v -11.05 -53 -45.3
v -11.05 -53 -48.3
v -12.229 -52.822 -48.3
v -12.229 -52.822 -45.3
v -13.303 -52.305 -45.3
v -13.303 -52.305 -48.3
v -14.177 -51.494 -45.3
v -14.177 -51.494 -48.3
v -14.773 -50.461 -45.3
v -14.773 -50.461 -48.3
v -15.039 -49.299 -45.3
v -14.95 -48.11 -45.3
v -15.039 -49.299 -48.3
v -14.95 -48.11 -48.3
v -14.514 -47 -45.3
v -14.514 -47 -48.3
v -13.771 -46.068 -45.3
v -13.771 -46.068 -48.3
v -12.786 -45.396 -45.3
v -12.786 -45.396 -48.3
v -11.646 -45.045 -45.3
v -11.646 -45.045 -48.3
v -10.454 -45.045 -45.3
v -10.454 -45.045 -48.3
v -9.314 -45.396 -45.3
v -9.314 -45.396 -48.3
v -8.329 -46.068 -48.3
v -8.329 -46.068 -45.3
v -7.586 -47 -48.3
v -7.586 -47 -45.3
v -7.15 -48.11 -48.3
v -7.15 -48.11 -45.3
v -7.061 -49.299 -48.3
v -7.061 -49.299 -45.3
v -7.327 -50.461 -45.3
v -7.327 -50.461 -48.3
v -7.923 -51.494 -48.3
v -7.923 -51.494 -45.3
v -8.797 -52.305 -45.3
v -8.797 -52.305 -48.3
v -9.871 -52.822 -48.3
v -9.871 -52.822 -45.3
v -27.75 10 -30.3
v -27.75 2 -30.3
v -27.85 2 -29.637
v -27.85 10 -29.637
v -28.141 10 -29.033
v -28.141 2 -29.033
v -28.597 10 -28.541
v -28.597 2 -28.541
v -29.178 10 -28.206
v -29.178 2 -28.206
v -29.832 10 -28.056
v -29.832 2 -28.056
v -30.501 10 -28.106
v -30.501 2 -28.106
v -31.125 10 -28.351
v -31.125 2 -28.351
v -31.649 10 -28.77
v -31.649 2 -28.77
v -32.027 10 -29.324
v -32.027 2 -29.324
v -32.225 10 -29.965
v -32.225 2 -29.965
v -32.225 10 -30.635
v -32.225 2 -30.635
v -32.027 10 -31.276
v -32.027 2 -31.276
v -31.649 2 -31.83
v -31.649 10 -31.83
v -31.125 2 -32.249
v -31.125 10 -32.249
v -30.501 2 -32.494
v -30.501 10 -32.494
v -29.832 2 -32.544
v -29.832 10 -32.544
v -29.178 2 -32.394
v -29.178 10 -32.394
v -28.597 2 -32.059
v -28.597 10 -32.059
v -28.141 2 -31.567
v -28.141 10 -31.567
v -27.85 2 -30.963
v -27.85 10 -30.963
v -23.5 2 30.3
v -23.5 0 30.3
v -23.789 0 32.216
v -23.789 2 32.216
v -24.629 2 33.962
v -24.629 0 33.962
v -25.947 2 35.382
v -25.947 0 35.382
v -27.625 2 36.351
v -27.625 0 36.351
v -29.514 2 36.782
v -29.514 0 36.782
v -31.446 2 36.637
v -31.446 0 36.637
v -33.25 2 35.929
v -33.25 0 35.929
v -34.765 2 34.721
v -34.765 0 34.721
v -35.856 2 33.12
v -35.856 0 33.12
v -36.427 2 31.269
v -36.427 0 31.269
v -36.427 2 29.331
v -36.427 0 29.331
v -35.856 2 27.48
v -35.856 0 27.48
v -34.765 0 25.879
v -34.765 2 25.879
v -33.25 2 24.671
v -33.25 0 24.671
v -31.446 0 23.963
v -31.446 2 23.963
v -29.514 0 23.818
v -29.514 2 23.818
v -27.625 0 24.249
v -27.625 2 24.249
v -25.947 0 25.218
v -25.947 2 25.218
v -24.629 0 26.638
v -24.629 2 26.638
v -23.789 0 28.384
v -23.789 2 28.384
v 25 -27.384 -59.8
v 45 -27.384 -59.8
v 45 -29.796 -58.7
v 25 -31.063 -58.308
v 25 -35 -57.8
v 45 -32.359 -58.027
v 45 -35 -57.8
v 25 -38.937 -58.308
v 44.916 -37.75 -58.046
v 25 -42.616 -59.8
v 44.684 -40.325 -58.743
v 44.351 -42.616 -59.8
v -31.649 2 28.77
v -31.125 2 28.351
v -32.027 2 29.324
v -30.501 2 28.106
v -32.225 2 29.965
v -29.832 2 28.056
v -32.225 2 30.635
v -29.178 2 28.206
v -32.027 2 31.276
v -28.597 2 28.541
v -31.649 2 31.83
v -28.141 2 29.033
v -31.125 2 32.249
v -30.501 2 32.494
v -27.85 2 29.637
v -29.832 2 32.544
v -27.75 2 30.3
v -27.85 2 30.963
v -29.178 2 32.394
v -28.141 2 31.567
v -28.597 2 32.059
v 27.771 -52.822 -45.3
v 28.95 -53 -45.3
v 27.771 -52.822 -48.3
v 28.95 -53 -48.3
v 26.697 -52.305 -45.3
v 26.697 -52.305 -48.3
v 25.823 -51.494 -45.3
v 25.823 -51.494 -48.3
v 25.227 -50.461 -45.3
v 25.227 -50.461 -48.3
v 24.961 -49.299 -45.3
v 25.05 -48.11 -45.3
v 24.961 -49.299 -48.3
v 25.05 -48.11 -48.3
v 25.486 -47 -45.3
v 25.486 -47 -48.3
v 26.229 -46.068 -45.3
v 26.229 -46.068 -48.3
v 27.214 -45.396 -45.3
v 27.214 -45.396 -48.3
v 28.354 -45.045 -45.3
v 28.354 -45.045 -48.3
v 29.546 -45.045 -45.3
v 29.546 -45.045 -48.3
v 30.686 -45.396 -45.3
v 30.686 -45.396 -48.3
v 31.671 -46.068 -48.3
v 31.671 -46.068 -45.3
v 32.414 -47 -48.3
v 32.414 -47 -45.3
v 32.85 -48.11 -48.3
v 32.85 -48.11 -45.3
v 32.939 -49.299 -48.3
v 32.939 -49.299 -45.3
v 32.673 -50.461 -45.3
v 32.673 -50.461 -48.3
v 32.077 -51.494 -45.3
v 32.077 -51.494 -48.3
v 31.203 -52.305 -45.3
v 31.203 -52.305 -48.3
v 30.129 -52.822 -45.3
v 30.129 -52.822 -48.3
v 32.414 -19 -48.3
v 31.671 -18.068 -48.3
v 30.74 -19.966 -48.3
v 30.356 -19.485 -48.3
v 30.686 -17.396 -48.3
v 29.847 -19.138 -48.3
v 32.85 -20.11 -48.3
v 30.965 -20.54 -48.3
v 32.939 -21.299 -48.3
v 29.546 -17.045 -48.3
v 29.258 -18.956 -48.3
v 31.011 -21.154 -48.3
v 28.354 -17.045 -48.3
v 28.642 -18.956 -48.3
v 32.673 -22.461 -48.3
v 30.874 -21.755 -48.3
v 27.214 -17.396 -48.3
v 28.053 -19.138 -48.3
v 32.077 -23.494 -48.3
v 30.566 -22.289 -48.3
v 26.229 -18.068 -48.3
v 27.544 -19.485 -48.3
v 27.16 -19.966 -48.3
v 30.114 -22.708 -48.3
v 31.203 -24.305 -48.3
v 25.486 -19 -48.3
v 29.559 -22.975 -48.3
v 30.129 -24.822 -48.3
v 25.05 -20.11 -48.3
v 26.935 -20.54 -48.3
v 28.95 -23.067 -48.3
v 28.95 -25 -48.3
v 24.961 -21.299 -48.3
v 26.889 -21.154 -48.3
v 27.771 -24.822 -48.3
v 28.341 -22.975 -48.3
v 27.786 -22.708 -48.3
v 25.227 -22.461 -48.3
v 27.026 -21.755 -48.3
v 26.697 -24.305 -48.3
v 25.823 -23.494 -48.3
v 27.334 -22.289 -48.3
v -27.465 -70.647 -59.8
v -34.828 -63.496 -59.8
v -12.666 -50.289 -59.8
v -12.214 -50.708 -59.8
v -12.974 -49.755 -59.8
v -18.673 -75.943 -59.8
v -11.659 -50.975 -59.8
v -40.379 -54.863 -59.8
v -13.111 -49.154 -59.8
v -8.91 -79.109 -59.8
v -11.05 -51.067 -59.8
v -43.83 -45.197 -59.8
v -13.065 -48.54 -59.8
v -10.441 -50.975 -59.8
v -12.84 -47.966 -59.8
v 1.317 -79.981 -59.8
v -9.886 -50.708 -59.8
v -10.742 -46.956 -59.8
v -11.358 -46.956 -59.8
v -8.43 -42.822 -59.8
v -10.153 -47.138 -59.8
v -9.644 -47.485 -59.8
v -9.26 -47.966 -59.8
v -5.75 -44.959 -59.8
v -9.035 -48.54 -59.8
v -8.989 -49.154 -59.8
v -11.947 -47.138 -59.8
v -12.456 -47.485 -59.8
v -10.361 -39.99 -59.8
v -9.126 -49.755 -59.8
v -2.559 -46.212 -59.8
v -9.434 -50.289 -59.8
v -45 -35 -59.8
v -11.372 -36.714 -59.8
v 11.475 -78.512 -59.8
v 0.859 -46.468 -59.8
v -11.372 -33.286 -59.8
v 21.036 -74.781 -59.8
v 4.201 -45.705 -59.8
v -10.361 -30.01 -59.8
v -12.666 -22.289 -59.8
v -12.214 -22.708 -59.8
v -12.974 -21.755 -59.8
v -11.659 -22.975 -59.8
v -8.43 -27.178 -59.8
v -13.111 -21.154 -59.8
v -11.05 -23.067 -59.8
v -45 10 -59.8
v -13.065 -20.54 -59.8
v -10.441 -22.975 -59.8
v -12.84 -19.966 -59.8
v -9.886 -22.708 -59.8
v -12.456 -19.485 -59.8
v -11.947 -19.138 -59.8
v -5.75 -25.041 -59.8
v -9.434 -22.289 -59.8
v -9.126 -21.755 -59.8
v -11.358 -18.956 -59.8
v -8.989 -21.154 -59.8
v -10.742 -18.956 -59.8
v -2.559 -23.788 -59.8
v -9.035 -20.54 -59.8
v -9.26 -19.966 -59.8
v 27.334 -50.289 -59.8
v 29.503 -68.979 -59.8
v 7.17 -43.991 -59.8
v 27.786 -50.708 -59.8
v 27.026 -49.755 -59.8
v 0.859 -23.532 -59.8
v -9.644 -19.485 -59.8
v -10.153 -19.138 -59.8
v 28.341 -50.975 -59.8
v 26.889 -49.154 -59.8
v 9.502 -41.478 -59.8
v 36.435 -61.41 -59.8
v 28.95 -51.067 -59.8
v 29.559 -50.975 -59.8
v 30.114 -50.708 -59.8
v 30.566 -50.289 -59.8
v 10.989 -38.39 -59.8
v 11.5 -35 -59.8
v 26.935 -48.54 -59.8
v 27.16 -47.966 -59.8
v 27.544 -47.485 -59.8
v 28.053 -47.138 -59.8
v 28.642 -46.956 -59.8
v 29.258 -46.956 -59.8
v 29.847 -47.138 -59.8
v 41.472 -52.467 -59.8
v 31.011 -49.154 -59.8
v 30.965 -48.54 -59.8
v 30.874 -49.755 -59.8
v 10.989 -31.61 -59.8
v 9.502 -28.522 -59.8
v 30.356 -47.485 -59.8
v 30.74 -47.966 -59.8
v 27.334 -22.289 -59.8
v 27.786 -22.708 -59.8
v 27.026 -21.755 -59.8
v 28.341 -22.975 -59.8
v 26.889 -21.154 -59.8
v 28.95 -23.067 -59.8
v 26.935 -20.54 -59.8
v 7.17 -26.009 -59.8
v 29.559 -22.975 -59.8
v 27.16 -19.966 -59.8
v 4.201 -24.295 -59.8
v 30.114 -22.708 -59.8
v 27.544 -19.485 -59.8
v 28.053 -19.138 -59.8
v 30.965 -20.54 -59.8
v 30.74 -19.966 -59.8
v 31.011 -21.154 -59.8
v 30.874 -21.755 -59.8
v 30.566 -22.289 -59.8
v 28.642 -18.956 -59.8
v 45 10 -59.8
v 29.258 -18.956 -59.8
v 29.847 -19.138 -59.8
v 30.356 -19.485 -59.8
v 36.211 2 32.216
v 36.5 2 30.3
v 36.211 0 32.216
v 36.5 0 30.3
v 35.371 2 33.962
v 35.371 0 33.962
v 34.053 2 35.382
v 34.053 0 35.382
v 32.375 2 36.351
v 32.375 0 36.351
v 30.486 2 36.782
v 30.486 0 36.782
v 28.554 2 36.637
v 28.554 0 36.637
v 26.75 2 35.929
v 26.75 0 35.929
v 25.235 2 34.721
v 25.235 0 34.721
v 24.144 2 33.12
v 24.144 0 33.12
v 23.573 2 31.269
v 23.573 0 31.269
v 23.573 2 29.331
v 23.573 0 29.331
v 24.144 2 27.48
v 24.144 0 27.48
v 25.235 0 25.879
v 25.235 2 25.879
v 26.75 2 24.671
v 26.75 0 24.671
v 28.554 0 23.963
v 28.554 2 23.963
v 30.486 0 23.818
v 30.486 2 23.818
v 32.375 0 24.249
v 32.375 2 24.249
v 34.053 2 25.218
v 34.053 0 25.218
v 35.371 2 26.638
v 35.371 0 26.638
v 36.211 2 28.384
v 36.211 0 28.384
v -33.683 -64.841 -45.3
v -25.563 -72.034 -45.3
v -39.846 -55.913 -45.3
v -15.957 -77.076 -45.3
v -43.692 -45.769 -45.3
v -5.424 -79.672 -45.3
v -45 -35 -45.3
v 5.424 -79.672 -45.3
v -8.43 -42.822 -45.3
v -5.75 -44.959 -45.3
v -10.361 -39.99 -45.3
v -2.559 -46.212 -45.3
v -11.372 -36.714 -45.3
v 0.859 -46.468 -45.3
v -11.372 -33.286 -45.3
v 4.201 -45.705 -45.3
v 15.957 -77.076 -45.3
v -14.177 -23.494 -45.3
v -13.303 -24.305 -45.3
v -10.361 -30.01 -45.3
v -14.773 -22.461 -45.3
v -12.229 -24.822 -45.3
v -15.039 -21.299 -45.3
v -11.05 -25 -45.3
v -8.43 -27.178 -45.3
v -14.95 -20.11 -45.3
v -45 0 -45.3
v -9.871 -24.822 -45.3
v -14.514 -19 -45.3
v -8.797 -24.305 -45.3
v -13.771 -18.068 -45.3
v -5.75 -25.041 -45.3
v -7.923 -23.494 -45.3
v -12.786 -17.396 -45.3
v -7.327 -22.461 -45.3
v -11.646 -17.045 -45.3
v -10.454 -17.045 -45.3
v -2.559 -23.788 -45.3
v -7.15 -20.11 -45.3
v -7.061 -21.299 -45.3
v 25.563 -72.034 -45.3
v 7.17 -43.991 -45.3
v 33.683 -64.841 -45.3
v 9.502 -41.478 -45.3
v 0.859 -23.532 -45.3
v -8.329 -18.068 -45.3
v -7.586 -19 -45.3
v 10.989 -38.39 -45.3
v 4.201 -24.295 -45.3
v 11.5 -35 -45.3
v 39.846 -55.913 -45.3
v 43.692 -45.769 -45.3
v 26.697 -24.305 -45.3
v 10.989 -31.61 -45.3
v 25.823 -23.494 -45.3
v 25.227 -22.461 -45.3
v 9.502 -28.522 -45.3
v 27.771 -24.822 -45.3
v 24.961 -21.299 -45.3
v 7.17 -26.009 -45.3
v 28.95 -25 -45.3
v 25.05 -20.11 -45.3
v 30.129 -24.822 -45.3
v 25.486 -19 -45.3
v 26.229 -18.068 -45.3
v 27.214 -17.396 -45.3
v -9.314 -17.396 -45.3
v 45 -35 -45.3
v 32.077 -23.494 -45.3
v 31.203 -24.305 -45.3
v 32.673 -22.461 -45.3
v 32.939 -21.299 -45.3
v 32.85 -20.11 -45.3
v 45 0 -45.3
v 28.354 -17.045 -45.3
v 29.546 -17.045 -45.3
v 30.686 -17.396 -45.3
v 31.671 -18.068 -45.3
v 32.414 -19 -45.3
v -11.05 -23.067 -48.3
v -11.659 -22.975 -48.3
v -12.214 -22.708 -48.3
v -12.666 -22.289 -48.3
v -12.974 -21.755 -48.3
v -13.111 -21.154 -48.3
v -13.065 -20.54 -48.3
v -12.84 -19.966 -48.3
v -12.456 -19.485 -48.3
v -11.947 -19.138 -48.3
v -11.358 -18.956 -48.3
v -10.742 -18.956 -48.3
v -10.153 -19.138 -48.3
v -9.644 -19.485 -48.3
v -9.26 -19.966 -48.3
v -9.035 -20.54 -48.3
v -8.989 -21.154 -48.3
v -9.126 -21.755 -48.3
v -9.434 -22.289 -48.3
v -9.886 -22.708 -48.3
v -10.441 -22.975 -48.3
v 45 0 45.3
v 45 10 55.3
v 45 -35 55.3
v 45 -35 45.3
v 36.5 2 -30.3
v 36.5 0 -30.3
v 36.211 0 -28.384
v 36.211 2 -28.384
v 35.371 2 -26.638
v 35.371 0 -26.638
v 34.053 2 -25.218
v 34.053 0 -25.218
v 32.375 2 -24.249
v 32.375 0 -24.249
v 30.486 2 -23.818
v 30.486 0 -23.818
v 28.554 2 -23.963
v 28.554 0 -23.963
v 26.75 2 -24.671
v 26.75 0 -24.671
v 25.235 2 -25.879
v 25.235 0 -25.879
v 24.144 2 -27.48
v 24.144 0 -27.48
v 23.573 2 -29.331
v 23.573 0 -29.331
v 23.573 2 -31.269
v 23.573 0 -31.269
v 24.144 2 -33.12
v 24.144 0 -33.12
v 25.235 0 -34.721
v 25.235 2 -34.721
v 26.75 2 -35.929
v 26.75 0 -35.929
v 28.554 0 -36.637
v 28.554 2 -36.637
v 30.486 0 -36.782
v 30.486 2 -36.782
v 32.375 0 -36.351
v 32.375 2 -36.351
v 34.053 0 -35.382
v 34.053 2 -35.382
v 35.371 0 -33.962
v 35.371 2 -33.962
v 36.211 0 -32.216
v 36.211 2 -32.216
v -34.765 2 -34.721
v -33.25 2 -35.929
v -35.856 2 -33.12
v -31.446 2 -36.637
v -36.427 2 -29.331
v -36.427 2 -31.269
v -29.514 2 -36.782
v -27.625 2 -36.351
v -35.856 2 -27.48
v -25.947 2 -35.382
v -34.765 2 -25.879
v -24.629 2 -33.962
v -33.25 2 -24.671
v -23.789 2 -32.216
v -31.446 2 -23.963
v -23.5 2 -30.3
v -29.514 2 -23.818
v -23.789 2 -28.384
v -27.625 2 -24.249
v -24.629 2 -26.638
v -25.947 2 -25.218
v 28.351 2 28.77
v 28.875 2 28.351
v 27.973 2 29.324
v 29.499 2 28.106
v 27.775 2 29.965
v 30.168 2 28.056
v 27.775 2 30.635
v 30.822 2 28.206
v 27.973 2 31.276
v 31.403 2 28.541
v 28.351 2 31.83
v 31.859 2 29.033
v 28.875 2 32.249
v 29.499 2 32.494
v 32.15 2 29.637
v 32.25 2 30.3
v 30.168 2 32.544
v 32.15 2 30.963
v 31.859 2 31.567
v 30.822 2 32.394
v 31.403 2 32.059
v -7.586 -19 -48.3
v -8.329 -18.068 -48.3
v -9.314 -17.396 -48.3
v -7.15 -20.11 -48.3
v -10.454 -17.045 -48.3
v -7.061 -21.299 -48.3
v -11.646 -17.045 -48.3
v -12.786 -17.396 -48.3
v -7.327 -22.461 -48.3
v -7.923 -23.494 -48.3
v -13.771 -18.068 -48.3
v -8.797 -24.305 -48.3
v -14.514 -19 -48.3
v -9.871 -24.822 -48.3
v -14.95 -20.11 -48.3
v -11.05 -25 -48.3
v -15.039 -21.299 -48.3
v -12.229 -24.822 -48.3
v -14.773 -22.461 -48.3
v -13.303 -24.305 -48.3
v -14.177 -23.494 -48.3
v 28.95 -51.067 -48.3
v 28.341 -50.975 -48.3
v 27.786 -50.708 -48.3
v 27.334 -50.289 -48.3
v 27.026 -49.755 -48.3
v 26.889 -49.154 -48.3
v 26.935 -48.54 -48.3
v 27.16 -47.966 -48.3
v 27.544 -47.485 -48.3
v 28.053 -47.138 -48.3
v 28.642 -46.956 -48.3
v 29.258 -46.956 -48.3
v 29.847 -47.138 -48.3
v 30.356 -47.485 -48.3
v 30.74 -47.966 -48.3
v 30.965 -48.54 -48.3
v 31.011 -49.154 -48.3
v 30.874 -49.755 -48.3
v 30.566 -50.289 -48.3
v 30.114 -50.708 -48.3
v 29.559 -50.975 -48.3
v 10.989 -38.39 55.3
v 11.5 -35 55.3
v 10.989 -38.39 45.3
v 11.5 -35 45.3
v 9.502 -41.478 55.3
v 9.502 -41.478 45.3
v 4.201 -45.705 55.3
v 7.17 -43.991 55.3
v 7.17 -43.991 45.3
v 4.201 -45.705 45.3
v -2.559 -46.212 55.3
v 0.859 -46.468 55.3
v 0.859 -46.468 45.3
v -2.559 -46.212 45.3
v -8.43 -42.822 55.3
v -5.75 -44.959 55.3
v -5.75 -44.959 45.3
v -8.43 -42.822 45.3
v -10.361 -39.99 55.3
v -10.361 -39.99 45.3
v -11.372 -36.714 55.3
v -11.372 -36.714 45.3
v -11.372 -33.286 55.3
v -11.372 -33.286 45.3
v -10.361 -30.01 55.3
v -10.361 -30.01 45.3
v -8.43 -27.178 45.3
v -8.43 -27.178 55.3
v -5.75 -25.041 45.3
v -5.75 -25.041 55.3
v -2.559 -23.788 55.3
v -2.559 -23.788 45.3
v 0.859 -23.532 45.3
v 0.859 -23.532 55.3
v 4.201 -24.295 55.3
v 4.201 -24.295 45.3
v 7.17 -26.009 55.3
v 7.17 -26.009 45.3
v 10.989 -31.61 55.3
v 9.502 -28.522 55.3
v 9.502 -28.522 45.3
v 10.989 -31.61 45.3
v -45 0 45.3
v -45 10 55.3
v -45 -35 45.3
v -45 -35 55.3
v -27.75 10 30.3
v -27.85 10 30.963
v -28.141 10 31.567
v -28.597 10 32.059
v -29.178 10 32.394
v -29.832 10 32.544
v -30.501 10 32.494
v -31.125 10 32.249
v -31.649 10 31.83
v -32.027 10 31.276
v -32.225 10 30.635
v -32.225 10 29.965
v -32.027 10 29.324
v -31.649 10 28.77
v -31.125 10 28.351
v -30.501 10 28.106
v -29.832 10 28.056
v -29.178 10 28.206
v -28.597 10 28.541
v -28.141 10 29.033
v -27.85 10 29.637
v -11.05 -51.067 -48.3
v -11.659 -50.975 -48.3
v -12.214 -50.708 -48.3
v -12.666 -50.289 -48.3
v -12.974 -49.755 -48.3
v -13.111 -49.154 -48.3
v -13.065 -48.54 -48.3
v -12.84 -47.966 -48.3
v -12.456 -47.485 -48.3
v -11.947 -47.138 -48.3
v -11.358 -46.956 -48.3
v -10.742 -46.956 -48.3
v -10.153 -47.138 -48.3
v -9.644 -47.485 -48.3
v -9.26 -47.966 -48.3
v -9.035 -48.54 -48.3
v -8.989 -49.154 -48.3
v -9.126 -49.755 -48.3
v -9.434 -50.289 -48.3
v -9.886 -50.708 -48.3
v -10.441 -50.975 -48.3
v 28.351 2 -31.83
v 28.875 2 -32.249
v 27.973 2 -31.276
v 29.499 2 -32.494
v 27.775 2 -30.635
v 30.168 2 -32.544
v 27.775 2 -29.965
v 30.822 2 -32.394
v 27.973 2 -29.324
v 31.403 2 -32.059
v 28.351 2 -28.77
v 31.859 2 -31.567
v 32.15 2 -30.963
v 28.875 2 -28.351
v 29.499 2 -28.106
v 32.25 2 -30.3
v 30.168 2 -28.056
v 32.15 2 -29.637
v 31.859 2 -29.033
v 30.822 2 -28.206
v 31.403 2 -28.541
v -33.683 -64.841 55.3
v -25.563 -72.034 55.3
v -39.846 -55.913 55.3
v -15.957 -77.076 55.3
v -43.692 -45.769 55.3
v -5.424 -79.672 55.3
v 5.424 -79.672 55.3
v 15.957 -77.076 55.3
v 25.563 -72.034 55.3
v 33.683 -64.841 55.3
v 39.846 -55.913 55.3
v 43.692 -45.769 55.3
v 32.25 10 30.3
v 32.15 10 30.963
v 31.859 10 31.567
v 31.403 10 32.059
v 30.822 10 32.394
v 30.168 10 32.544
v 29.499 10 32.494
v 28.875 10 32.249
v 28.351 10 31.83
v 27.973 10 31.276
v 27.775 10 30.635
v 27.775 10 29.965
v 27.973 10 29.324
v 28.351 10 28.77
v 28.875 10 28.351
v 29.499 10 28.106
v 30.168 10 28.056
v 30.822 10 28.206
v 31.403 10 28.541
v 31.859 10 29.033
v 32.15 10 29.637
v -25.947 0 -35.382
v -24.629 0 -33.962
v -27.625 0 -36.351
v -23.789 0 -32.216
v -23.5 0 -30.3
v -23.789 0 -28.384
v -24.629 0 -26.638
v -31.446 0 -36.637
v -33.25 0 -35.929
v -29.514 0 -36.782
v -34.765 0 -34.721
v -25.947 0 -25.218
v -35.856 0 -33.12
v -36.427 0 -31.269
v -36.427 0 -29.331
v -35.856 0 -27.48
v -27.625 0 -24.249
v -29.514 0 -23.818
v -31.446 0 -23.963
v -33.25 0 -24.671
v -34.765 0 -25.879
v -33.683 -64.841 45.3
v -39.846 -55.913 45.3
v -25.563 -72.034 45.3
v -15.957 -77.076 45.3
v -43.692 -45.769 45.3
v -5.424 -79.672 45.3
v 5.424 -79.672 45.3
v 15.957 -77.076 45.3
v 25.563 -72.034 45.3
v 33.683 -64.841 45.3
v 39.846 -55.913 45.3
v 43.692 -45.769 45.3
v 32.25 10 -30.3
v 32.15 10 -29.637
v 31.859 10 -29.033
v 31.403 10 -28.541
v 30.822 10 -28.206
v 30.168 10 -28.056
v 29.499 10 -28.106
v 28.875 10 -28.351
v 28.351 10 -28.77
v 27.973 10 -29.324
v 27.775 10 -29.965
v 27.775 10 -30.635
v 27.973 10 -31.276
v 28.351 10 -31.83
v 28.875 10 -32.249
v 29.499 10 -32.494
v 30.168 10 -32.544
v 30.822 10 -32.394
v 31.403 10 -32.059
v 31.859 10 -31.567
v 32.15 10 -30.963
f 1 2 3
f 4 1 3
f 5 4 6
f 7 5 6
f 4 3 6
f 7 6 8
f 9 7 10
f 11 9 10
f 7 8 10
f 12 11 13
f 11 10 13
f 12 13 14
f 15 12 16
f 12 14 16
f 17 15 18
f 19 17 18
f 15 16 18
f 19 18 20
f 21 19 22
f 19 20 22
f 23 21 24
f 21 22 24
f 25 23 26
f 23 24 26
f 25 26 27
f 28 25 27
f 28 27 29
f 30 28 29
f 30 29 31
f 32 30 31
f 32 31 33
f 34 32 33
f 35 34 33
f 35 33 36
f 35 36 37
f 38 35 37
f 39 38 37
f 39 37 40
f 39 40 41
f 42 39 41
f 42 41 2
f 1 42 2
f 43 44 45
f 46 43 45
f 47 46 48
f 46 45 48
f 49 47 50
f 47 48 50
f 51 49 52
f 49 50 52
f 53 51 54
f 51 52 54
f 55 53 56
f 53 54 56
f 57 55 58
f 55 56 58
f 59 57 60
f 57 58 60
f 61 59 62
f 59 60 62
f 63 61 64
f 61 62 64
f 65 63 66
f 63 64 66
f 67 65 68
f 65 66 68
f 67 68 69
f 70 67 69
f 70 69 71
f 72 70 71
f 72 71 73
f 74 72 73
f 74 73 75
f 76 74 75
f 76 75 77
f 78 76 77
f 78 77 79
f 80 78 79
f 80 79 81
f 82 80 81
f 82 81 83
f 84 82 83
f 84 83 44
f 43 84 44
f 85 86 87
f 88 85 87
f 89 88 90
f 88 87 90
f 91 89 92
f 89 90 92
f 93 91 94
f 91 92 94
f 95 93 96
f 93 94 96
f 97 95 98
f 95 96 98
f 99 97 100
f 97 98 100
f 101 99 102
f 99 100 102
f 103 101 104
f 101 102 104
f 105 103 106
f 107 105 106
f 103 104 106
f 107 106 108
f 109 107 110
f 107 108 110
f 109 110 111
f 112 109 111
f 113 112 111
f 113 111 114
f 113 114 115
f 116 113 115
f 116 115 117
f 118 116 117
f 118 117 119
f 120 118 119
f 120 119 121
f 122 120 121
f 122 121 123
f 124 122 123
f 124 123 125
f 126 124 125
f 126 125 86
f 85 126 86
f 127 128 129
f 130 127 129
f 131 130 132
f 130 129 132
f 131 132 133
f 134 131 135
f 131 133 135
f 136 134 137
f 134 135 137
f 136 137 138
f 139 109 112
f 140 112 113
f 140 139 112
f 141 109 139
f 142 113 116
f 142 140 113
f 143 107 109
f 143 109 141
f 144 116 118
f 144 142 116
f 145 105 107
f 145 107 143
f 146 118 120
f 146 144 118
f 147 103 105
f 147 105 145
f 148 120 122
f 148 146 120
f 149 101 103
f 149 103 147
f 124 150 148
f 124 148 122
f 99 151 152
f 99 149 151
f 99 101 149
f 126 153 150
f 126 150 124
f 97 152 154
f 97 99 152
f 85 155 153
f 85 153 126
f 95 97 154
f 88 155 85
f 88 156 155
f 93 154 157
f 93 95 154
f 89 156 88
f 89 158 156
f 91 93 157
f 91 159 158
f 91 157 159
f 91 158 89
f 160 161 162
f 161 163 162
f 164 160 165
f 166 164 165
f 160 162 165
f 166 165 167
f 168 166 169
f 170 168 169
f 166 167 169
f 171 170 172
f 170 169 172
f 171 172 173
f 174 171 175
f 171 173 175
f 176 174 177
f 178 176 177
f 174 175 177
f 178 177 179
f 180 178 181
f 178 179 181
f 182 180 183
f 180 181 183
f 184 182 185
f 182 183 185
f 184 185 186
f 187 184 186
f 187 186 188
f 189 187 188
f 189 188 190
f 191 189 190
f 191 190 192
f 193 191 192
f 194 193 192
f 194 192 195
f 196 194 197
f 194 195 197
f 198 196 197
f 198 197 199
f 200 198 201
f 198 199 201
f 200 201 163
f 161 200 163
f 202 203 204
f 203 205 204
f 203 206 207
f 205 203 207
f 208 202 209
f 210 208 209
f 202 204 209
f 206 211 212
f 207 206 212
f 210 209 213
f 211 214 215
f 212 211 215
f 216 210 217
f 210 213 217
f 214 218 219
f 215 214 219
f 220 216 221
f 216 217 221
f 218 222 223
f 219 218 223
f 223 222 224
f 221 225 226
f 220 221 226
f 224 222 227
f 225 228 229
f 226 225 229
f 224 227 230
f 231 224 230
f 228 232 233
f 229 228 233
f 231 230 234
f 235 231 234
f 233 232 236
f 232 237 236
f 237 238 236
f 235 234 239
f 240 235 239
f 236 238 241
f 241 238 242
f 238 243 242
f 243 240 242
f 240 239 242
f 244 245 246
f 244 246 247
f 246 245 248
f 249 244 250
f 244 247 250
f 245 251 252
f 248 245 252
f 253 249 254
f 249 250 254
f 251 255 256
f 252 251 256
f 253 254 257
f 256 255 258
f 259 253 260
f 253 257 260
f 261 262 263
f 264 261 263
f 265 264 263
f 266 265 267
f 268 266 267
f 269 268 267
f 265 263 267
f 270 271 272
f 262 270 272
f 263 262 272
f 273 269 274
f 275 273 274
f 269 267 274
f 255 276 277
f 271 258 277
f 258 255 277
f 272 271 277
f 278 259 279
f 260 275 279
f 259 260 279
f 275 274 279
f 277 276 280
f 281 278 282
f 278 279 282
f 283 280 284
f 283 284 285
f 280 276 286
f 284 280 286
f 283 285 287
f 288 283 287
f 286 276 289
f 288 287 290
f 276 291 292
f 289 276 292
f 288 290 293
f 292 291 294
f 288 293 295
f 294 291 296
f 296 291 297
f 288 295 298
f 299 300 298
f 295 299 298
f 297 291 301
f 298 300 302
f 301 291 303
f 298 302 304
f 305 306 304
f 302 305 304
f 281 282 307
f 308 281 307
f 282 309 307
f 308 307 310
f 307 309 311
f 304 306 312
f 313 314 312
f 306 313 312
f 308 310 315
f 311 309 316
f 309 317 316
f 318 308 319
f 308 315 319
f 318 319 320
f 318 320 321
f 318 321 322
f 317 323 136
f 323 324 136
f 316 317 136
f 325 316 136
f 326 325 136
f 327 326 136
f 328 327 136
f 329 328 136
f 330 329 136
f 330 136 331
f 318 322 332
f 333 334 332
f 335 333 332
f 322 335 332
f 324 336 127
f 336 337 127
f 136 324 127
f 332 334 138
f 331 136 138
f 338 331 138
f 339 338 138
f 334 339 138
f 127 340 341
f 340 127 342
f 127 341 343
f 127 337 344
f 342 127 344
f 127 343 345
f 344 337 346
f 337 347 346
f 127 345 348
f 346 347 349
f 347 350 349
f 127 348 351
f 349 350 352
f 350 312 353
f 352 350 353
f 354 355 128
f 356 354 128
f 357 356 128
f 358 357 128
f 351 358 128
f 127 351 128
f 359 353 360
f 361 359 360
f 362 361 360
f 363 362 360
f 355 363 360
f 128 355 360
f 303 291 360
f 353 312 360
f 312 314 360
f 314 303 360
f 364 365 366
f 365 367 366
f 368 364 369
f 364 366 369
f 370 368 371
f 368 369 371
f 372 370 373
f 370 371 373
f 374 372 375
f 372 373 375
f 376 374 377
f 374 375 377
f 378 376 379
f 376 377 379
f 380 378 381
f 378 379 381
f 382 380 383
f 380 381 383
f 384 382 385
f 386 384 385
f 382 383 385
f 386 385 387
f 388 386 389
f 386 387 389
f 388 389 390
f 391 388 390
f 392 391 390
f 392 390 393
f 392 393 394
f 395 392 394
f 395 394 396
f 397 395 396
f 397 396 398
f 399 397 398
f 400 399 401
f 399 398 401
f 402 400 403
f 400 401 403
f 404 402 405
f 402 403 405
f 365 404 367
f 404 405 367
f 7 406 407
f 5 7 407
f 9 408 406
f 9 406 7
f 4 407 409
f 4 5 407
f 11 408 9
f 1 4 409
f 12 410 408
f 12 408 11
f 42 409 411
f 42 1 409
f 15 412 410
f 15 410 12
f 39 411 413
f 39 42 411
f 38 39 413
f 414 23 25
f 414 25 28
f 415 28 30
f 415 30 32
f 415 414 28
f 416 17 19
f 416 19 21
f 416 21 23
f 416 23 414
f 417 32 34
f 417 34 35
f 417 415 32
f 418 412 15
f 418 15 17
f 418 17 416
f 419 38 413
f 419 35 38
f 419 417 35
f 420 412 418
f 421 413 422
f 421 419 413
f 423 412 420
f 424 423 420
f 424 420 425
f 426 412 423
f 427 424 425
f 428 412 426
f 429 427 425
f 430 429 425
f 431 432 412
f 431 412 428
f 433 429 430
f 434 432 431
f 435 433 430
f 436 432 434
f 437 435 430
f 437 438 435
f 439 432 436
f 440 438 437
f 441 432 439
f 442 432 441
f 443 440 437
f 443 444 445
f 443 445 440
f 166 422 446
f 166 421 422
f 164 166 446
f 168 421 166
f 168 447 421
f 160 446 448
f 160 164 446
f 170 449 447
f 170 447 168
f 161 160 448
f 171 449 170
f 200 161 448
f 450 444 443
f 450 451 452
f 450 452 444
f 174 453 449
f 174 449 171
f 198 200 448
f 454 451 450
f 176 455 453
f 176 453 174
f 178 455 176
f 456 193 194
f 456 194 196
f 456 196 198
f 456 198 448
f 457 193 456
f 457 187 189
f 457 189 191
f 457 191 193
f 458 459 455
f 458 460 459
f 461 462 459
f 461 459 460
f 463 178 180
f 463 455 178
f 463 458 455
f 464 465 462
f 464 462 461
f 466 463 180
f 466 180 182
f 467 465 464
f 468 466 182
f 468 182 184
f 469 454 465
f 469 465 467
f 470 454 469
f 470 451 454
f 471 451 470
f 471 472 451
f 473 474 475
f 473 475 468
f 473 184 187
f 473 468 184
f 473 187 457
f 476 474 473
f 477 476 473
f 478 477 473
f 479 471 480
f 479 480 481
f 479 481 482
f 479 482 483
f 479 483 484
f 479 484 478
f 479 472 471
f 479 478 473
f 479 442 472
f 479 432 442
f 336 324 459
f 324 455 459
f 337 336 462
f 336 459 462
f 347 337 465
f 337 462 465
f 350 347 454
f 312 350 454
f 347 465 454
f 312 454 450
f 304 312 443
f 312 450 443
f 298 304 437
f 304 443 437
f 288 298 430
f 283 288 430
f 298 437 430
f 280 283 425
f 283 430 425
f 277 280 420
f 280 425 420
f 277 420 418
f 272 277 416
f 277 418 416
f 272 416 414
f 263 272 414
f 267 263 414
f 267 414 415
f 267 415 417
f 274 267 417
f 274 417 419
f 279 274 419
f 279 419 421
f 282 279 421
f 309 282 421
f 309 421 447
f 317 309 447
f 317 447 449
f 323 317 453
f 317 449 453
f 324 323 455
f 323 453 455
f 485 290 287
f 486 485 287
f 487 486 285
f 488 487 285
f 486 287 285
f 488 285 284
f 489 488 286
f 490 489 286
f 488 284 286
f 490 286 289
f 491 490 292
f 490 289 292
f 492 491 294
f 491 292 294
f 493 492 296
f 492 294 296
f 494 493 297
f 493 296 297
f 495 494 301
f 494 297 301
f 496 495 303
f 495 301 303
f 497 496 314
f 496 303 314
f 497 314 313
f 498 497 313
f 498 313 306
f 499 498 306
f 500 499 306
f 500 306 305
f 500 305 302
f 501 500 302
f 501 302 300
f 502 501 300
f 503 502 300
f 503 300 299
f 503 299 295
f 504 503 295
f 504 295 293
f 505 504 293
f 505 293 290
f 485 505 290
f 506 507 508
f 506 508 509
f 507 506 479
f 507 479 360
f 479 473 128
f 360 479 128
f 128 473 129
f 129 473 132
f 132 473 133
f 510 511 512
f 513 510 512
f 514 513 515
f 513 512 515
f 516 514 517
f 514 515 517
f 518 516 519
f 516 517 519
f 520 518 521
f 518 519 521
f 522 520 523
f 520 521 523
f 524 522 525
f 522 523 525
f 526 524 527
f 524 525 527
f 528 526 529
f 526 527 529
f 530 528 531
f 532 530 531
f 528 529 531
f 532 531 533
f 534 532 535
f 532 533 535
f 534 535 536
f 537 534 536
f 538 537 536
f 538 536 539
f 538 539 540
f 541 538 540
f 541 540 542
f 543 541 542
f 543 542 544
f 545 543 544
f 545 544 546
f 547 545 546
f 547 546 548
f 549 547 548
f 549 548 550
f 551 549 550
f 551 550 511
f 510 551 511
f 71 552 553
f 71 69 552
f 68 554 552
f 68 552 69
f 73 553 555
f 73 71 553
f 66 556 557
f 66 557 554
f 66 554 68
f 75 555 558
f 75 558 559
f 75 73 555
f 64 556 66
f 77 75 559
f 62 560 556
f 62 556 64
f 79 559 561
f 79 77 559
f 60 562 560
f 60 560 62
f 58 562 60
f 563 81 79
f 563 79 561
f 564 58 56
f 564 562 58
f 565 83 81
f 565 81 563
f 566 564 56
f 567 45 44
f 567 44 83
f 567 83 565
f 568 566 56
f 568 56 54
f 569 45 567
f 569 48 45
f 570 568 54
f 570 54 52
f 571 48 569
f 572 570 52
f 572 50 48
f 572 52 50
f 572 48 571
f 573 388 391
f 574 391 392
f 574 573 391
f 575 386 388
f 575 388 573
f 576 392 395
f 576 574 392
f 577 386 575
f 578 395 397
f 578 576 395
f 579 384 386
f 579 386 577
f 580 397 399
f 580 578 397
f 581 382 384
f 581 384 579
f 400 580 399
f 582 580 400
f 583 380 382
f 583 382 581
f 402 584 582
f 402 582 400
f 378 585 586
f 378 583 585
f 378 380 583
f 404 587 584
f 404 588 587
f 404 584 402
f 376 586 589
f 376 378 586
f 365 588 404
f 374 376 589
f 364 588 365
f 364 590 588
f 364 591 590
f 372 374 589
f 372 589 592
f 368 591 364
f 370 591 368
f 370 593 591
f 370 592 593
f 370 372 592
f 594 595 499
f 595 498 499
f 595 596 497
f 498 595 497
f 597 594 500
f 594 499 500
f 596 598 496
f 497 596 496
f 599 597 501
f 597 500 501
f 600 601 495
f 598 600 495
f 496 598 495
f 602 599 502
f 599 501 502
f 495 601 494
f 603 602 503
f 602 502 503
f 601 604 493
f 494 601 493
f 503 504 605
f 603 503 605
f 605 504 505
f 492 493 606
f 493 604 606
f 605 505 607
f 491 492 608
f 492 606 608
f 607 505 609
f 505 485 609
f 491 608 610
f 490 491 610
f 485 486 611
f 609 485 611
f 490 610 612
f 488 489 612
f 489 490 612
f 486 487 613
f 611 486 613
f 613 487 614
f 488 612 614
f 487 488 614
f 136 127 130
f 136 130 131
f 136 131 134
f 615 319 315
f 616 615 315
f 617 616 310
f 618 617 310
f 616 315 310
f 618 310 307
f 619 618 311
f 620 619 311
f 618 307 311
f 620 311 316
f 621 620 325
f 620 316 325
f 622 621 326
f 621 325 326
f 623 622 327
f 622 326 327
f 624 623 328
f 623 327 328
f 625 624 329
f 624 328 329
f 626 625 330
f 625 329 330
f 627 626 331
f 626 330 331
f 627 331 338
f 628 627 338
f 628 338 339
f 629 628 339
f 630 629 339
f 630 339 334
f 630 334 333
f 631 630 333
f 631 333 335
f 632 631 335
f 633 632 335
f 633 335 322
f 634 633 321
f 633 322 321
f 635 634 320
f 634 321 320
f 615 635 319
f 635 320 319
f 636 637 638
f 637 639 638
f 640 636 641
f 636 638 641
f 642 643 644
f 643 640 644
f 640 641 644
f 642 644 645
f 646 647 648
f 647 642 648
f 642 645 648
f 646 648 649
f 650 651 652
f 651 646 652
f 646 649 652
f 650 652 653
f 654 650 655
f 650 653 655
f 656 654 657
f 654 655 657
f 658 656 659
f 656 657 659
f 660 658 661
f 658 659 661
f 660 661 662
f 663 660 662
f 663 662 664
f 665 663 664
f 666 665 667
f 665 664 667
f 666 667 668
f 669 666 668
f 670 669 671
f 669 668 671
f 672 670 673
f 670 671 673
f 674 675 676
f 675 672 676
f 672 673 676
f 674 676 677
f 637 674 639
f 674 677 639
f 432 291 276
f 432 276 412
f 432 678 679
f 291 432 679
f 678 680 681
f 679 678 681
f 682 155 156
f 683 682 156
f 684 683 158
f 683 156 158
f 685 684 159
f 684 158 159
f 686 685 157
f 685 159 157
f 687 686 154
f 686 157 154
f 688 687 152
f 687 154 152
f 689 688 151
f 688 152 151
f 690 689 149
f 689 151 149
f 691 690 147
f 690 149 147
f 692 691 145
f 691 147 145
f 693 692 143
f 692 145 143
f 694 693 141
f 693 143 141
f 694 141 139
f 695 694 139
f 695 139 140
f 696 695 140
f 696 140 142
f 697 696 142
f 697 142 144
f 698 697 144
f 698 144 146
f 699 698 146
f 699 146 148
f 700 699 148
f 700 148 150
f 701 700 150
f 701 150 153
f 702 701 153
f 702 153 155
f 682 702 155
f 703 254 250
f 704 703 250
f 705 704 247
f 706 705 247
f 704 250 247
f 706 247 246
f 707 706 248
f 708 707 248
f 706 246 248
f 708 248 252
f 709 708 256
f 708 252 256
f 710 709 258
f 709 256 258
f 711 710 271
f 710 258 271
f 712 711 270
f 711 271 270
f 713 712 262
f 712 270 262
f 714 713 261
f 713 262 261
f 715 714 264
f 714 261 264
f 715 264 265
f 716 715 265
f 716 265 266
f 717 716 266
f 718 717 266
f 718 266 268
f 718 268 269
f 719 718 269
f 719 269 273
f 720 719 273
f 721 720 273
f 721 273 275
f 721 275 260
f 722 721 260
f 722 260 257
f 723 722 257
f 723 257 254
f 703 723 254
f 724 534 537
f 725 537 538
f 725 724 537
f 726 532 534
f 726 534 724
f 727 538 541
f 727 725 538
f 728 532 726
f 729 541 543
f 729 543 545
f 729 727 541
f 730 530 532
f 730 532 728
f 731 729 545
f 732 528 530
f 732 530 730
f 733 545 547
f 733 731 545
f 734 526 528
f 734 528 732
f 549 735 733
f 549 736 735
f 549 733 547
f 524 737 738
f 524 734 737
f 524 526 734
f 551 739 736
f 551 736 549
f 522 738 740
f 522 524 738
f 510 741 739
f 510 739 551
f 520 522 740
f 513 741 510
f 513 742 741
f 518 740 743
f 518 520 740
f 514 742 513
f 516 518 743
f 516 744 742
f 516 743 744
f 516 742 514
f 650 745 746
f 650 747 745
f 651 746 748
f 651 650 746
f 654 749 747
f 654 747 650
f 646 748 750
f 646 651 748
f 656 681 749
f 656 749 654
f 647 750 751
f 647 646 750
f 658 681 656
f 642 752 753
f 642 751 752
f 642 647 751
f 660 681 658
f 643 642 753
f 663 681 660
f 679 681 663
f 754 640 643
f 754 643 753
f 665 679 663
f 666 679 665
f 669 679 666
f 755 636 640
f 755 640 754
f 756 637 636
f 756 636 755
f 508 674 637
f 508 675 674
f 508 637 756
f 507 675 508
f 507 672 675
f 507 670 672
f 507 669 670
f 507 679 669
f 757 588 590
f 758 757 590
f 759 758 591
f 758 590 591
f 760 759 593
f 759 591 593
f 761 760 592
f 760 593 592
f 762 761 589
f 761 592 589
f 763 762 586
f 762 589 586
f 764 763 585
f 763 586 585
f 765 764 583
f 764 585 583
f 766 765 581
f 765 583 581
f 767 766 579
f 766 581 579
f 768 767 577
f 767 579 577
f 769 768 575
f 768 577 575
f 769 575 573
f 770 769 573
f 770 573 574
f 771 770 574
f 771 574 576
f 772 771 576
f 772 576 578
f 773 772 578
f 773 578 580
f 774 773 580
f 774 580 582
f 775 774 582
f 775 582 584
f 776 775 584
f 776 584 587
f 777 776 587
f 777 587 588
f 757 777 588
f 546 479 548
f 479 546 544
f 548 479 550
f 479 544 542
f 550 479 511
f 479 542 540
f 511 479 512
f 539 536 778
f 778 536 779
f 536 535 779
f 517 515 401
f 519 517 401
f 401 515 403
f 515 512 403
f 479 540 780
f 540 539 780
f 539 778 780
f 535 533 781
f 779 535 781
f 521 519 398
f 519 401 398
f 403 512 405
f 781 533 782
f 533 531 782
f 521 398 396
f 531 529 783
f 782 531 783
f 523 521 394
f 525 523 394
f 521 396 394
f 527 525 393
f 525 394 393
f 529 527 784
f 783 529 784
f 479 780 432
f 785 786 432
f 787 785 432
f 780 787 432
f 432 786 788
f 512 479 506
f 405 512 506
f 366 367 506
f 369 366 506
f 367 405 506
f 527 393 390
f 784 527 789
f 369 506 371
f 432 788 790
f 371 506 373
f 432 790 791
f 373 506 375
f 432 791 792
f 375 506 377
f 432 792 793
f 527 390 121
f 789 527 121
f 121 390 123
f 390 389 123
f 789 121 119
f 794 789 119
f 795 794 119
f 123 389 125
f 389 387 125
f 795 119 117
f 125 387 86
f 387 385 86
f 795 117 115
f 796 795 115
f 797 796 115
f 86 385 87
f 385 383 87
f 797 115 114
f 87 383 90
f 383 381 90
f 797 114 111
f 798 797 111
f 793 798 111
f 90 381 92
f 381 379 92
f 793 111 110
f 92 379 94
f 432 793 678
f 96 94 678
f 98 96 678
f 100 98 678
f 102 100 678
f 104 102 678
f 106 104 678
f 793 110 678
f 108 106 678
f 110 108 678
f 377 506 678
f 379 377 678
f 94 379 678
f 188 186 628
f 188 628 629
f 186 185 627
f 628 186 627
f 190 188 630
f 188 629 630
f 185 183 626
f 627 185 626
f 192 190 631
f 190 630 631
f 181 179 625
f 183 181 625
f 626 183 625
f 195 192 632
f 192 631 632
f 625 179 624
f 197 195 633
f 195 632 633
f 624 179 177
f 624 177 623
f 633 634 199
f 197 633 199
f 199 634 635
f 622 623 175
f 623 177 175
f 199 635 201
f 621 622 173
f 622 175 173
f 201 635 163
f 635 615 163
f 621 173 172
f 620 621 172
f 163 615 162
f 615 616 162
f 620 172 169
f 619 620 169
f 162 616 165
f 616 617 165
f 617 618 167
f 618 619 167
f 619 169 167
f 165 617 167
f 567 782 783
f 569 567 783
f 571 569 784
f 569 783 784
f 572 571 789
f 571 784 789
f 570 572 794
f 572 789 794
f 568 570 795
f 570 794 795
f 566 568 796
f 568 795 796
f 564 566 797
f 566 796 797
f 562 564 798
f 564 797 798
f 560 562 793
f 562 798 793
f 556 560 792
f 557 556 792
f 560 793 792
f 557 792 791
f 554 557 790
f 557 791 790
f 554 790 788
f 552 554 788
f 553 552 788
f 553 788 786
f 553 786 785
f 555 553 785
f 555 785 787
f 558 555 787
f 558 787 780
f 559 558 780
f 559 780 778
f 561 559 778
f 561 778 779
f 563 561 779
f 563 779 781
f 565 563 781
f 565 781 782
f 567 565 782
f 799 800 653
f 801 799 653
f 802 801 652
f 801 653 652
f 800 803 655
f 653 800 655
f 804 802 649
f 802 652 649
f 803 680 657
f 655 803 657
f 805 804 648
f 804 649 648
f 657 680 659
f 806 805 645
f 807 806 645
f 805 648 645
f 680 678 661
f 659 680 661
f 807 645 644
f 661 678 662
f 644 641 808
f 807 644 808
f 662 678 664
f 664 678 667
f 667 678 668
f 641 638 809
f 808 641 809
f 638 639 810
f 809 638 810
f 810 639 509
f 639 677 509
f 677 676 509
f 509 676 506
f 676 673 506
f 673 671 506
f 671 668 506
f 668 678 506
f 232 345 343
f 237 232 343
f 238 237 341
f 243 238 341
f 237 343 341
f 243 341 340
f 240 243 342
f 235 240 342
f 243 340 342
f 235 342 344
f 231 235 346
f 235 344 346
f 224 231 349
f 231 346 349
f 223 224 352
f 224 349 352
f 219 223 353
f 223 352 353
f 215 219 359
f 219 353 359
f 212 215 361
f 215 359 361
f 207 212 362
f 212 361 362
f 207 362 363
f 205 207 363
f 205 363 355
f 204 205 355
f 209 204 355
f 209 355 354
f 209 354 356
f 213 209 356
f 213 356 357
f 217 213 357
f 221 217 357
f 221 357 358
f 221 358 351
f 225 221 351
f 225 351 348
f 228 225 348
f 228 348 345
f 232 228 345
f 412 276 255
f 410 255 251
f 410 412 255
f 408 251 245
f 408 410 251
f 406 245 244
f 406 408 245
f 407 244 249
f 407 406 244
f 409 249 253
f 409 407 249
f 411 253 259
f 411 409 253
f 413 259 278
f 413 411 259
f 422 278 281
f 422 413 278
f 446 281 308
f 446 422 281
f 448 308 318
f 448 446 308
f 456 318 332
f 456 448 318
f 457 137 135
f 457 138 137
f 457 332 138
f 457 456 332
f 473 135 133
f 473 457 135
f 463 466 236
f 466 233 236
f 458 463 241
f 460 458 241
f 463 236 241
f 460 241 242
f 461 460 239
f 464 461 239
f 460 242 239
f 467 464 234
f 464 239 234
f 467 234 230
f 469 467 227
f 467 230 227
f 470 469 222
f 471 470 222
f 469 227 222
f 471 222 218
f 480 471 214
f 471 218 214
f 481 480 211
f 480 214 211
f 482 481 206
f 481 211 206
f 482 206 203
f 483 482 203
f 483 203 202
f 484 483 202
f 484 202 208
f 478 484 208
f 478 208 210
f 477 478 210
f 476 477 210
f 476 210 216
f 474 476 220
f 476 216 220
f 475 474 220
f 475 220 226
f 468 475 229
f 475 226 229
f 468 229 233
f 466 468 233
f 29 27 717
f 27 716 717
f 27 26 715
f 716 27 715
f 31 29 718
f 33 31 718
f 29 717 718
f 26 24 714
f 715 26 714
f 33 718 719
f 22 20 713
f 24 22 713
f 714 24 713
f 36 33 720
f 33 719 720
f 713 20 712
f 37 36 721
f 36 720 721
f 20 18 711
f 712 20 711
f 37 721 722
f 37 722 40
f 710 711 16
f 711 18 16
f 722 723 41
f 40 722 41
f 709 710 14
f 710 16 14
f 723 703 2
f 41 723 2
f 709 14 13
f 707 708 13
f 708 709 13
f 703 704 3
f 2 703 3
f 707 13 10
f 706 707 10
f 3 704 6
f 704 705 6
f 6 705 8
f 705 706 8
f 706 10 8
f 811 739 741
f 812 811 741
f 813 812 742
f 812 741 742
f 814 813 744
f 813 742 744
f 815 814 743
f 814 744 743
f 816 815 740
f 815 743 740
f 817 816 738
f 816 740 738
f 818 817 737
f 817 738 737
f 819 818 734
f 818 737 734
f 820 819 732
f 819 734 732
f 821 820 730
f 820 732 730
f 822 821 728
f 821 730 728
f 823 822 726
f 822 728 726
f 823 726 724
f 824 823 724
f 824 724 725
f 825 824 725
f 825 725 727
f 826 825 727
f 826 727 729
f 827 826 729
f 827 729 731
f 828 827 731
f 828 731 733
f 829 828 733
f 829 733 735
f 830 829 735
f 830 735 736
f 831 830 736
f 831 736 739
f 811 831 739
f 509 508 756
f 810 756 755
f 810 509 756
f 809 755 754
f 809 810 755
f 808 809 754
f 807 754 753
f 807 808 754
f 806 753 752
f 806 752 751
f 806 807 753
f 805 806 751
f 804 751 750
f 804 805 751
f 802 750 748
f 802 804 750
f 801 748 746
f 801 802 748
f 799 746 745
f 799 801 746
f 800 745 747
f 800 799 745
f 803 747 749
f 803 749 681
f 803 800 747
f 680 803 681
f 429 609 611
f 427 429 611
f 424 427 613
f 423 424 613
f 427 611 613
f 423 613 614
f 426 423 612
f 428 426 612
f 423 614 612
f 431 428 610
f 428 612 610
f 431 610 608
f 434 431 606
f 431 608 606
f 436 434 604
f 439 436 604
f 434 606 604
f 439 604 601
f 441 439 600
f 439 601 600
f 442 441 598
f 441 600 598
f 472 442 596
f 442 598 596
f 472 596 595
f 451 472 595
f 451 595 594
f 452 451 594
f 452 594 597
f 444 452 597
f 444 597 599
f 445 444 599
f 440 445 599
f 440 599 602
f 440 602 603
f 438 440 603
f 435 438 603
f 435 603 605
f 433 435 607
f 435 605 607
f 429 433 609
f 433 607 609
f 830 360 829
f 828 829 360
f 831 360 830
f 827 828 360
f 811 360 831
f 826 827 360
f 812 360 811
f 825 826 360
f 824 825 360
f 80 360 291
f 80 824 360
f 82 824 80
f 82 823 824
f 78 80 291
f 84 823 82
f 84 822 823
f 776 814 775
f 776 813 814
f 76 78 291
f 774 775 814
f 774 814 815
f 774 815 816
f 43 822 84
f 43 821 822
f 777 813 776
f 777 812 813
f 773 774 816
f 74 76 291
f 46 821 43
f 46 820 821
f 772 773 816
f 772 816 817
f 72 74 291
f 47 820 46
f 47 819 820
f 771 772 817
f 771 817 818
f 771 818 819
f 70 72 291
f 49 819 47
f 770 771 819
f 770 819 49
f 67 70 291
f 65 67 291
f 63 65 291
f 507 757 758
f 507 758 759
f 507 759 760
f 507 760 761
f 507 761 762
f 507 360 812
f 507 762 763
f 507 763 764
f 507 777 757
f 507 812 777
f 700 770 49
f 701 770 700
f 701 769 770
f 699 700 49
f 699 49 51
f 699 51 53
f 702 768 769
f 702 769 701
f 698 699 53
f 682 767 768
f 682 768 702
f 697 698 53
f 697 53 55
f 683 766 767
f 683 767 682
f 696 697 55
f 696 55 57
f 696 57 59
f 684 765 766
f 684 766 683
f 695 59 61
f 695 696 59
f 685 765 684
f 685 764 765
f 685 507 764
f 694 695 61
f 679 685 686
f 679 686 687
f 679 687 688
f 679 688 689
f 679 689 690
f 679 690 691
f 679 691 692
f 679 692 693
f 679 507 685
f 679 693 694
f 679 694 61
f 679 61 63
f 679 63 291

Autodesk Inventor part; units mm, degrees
ref_plane "YZ Plane" through (0, 0, 0) normal (1, 0, 0) x (0, 1, 0)
ref_plane "XZ Plane" through (0, 0, 0) normal (0, 1, 0) x (-1, 0, 0)
ref_plane "XY Plane" through (0, 0, 0) normal (0, 0, 1) x (1, 0, 0)
sketch "Sketch1" plane through (0, 0, 0) normal (0, 1, 0) x (-1, 0, 0)
  line L0 (45, 45.3) -> (-45, 45.3)
  line L1 (-45, 45.3) -> (-45, -45.3)
  line L2 (-45, -45.3) -> (45, -45.3)
  line L3 (45, -45.3) -> (45, 45.3)
  line L4 (45, 45.3) -> (-45, -45.3) construction
  line L5 (-45, 45.3) -> (45, -45.3) construction
  point P0 (0, 0)
  dimension "d0" = 90
  dimension "d1" = 90.6
extrude "Extrusion1" add sketch "Sketch1" along normal blind 10
sketch "Sketch2" plane through (-45, 0, 45.3) normal (0, 0, 1) x (1, 0, 0)
  line L0 (90, 10) -> (0, 10) projected
  line L1 (0, 10) -> (90, 10)
  line L2 (90, 10) -> (90, -80)
  line L3 (90, -80) -> (0, -80)
  line L4 (0, -80) -> (0, 10)
  circle A0 centre (45, -35) radius 45
  circle A1 centre (45, -35) radius 11.5
  point P0 (45, 0)
  point P1 (0, -35)
  point P2 (90, -35)
  dimension "d4" = 90
  dimension "d5" = 90
  dimension "d10" = 23
extrude "Extrusion2" add sketch "Sketch2" along normal blind 10 contours L2 A0 L0 | A0 L4 L0 | A0
extrude "Extrusion4" add sketch "Sketch2" against normal blind 14.5 from surface at -90.6 contours L2 A0 L0 | A0 L4 L0 | A0
sketch "Sketch3" plane through (0, -35, -59.8) normal (0, 0, -1) x (-1, 0, 0)
  circle A0 centre (0, 0) radius 9.4
  circle A1 centre (11.05, 14) radius 2
  circle A2 centre (11.05, -14) radius 2
  circle A3 centre (-28.95, 14) radius 2
  circle A4 centre (-28.95, -14) radius 2
  circle A5 centre (0, 0) radius 8.9
  line L0 (-45, 45) -> (45, 45) projected
  point P0 (0, 35)
  dimension "d13" = 18.8
  dimension "d14" = 4
  dimension "d15" = 4
  dimension "d16" = 28
  dimension "d17" = 11.05
  dimension "d18" = 14
  dimension "d19" = 4
  dimension "d20" = 4
  dimension "d21" = 40
  dimension "d22" = 40
  dimension "d23" = 14
  dimension "d24" = 28
  dimension "d25" = 14
  dimension "d30" = 0.5
sketch "Sketch4" plane through (0, -35, -45.3) normal (0, 0, 1) x (1, 0, 0)
  circle A0 centre (28.95, 14) radius 2 projected
  circle A1 centre (28.95, -14) radius 2 projected
  circle A2 centre (-11.05, -14) radius 2 projected
  circle A3 centre (-11.05, 14) radius 2 projected
  point P0 (0, 35)
hole "Hole2" at (-11.05, -49, -45.3) at (-11.05, -21, -45.3) at (28.95, -49, -45.3) at (28.95, -21, -45.3) direction (0, 0, -1) diameter 4.134 depth 14.5 counterbore diameter 8 counterbore depth 3 thread size "M5x0.8" class "6H" standard "ISO Metric profile"
sketch "Sketch5" plane through (0, 0, 0) normal (0, -1, 0) x (1, 0, 0)
  circle A0 centre (-30, -30.3) radius 6.5
  line L0 (-45, -45.3) -> (-45, 45.3) projected
  line L1 (-45, 0) -> (45, 0)
  line L2 (45, -59.8) -> (45, 55.3) projected
  line L3 (-45, 45.3) -> (45, 45.3) projected
  line L4 (0, 45.3) -> (0, -45.3)
  line L5 (45, -45.3) -> (-45, -45.3) projected
  circle A1 centre (-30, -30.3) radius 2.25
  circle A2 centre (-30, 30.3) radius 6.5
  circle A3 centre (-30, 30.3) radius 2.25
  circle A4 centre (30, -30.3) radius 6.5
  circle A5 centre (30, -30.3) radius 2.25
  circle A6 centre (30, 30.3) radius 2.25
  circle A7 centre (30, 30.3) radius 6.5
  point P0 (0, 0)
  dimension "d59" = 13
  dimension "d60" = 15
  dimension "d61" = 15
  dimension "d62" = 4.5
extrude "Extrusion6" cut sketch "Sketch5" against normal blind 2 contours A0 | A2 | A4 | A7
extrude "Extrusion7" cut sketch "Sketch5" against normal through all contours A1 | A3 | A5 | A6
sketch "Sketch6" plane through (45, -35, 55.3) normal (1, 0, 0) x (0, 0, -1)
  line L0 (7.6158, 13.5) -> (-7.6158, 13.5)
  line L1 (115.1, 0) -> (128.6, 0)
  line L2 (115.1, 0) -> (100.6, 0) projected
  line L3 (115.1, -11.5) -> (115.1, 11.5) projected
  circle A0 centre (128.6, 0) radius 15.5
  line L4 (115.1, 45) -> (115.1, 0) projected
  line L5 (115.1, 7.6158) -> (115.1, -7.6158)
  point P0 (55.3, 35)
extrude "Extrusion8" cut sketch "Sketch6" against normal blind 20
properties part number "Holder2.2"
